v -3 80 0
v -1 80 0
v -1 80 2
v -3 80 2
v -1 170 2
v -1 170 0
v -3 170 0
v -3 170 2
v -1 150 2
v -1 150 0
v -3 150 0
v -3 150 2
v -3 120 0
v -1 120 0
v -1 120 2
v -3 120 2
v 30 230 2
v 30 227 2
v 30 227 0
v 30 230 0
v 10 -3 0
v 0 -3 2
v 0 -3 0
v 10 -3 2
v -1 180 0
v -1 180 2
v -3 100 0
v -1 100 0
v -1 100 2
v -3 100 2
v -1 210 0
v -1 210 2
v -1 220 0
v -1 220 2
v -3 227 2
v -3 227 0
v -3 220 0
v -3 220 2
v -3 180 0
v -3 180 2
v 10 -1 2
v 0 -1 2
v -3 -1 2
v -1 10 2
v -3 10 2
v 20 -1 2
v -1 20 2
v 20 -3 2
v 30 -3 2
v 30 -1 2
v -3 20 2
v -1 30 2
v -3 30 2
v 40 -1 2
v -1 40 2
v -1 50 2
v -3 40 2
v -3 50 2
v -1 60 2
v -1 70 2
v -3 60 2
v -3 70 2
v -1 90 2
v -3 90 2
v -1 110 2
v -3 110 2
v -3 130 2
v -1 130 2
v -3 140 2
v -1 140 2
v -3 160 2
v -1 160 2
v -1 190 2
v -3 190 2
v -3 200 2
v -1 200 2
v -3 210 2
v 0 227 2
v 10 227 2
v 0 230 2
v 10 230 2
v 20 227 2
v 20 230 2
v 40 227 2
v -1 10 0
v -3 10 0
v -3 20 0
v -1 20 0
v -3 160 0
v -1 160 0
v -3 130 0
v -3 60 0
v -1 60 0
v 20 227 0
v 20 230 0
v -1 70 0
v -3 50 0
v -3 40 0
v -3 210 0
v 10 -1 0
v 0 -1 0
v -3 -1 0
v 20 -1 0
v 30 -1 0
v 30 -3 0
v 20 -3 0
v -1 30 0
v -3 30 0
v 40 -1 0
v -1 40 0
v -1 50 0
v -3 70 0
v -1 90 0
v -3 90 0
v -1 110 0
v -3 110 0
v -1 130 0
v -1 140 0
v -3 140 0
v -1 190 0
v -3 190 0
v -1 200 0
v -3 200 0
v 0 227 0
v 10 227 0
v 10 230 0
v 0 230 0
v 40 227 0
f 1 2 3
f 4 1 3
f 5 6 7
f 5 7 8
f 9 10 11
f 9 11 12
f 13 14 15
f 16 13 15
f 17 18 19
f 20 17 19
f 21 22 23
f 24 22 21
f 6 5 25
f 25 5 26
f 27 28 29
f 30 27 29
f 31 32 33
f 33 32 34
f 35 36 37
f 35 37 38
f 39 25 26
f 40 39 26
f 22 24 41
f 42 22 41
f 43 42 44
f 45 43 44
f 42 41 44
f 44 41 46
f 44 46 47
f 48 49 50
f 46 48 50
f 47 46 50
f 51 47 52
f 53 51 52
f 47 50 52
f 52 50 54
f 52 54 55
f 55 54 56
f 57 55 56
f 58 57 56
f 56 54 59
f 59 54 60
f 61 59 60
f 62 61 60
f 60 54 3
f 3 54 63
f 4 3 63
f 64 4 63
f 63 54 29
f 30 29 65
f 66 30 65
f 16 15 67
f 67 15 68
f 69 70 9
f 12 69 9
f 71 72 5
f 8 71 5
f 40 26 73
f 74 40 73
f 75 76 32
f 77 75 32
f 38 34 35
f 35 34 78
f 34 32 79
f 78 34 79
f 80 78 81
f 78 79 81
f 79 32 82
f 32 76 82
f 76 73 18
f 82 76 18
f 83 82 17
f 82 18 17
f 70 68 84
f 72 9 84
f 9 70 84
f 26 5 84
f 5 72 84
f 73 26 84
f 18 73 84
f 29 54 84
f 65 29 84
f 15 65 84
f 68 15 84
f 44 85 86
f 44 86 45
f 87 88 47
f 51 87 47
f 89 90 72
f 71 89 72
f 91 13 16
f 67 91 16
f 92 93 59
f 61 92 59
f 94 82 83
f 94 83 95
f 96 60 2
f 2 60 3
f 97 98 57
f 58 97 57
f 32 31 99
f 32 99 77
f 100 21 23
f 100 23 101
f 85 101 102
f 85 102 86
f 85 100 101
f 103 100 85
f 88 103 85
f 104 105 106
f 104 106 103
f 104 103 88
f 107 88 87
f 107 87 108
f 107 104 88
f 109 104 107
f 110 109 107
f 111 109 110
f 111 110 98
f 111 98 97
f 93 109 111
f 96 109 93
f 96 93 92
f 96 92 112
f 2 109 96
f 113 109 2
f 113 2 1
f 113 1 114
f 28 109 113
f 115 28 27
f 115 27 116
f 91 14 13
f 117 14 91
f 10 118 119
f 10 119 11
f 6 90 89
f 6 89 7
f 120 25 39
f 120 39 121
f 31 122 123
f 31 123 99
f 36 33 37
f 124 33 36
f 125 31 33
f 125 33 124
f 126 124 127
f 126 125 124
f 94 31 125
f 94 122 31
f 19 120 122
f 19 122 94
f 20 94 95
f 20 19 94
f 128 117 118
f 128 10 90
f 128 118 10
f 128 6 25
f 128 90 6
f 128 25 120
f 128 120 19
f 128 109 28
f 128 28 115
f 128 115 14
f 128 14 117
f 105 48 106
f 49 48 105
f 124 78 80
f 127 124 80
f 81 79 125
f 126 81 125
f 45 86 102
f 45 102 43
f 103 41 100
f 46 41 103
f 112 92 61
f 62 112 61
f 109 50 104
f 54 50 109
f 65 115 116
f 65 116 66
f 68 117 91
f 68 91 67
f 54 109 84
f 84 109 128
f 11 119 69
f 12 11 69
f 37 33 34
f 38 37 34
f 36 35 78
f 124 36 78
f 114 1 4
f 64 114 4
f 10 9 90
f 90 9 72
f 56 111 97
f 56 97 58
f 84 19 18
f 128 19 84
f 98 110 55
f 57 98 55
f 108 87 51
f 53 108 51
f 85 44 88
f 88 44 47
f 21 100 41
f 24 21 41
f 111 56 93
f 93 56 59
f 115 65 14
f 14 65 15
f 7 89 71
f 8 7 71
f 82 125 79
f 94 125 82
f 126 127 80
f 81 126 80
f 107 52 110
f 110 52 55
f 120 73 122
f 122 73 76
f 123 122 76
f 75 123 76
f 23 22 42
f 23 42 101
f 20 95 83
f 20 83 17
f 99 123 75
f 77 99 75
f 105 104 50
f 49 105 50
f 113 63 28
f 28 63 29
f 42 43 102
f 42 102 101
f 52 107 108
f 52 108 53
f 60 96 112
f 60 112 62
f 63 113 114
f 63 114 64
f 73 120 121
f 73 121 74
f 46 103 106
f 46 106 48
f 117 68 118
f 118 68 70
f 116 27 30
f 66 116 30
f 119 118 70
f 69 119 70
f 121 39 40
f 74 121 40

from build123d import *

# Parameters (mm, degrees)
SKETCH1_W               = 40
SKETCH1_H               = 227
BOSS_EXTRUDE1_DEPTH     = 2
SKETCH2_W               = 10
SKETCH2_H               = 2
BOSS_EXTRUDE2_DEPTH     = 3
LPATTERN1_COUNT         = 2
LPATTERN1_PITCH         = 20
SKETCH3_W               = 10
SKETCH3_H               = 2
BOSS_EXTRUDE3_DEPTH     = 3
LPATTERN2_COUNT         = 2
LPATTERN2_PITCH         = 20
SKETCH4_W               = 2
SKETCH4_H               = 10
BOSS_EXTRUDE4_DEPTH     = 3
LPATTERN3_COUNT         = 12
LPATTERN3_PITCH         = 20
ESQUISSE1_W             = 3
ESQUISSE1_H             = 3
ENL_V_MAT_EXTRU_1_DEPTH = 3
ESQUISSE2_W             = 1
ESQUISSE2_H             = 227
ESQUISSE2_W_2           = 43
ESQUISSE2_H_2           = 1
BOSS_EXTRU_1_DEPTH      = 2


with BuildPart() as part:
    # Sketch1 → Boss-Extrude1 (new body)
    with BuildSketch(Plane.XY):
        with Locations((20, 113.5)):
            Rectangle(SKETCH1_W, SKETCH1_H)
    extrude(amount=BOSS_EXTRUDE1_DEPTH)

    # Sketch2 → Boss-Extrude2 (add)
    with BuildSketch(Plane.XZ):
        with Locations((25, 1)):
            Rectangle(SKETCH2_W, SKETCH2_H)
    boss_extrude2 = extrude(amount=BOSS_EXTRUDE2_DEPTH)

    # LPattern1: Boss-Extrude2 ×2
    with Locations(*[(-i * LPATTERN1_PITCH, 0, 0) for i in range(1, LPATTERN1_COUNT)]):
        add(boss_extrude2)

    # Sketch3 → Boss-Extrude3 (add)
    with BuildSketch(Plane(origin=(0, 227, 0), x_dir=(1, 0, 0), z_dir=(0, 1, 0))):
        with Locations((25, -1)):
            Rectangle(SKETCH3_W, SKETCH3_H)
    boss_extrude3 = extrude(amount=BOSS_EXTRUDE3_DEPTH)

    # LPattern2: Boss-Extrude3 ×2
    with Locations(*[(-i * LPATTERN2_PITCH, 0, 0) for i in range(1, LPATTERN2_COUNT)]):
        add(boss_extrude3)

    # Sketch4 → Boss-Extrude4 (add)
    with BuildSketch(Plane.ZY):
        with Locations((1, 5)):
            Rectangle(SKETCH4_W, SKETCH4_H)
    boss_extrude4 = extrude(amount=BOSS_EXTRUDE4_DEPTH)

    # LPattern3: Boss-Extrude4 ×12
    with Locations(*[(0, i * LPATTERN3_PITCH, 0) for i in range(1, LPATTERN3_COUNT)]):
        add(boss_extrude4)

    # Esquisse1 → Enlèv. mat.-Extru.1 (cut, through all)
    with BuildSketch(Plane.XY.offset(2)):
        with Locations((-1.5, 228.5)):
            Rectangle(ESQUISSE1_W, ESQUISSE1_H)
    extrude(amount=-ENL_V_MAT_EXTRU_1_DEPTH, mode=Mode.SUBTRACT)

    # Esquisse2 → Boss.-Extru.1 (add)
    with BuildSketch(Plane.XY.offset(2)):
        with Locations((-0.5, 113.5)):
            Rectangle(ESQUISSE2_W, ESQUISSE2_H)
        with Locations((18.5, -0.5)):
            Rectangle(ESQUISSE2_W_2, ESQUISSE2_H_2)
    extrude(amount=-BOSS_EXTRU_1_DEPTH)


solid = part.part
